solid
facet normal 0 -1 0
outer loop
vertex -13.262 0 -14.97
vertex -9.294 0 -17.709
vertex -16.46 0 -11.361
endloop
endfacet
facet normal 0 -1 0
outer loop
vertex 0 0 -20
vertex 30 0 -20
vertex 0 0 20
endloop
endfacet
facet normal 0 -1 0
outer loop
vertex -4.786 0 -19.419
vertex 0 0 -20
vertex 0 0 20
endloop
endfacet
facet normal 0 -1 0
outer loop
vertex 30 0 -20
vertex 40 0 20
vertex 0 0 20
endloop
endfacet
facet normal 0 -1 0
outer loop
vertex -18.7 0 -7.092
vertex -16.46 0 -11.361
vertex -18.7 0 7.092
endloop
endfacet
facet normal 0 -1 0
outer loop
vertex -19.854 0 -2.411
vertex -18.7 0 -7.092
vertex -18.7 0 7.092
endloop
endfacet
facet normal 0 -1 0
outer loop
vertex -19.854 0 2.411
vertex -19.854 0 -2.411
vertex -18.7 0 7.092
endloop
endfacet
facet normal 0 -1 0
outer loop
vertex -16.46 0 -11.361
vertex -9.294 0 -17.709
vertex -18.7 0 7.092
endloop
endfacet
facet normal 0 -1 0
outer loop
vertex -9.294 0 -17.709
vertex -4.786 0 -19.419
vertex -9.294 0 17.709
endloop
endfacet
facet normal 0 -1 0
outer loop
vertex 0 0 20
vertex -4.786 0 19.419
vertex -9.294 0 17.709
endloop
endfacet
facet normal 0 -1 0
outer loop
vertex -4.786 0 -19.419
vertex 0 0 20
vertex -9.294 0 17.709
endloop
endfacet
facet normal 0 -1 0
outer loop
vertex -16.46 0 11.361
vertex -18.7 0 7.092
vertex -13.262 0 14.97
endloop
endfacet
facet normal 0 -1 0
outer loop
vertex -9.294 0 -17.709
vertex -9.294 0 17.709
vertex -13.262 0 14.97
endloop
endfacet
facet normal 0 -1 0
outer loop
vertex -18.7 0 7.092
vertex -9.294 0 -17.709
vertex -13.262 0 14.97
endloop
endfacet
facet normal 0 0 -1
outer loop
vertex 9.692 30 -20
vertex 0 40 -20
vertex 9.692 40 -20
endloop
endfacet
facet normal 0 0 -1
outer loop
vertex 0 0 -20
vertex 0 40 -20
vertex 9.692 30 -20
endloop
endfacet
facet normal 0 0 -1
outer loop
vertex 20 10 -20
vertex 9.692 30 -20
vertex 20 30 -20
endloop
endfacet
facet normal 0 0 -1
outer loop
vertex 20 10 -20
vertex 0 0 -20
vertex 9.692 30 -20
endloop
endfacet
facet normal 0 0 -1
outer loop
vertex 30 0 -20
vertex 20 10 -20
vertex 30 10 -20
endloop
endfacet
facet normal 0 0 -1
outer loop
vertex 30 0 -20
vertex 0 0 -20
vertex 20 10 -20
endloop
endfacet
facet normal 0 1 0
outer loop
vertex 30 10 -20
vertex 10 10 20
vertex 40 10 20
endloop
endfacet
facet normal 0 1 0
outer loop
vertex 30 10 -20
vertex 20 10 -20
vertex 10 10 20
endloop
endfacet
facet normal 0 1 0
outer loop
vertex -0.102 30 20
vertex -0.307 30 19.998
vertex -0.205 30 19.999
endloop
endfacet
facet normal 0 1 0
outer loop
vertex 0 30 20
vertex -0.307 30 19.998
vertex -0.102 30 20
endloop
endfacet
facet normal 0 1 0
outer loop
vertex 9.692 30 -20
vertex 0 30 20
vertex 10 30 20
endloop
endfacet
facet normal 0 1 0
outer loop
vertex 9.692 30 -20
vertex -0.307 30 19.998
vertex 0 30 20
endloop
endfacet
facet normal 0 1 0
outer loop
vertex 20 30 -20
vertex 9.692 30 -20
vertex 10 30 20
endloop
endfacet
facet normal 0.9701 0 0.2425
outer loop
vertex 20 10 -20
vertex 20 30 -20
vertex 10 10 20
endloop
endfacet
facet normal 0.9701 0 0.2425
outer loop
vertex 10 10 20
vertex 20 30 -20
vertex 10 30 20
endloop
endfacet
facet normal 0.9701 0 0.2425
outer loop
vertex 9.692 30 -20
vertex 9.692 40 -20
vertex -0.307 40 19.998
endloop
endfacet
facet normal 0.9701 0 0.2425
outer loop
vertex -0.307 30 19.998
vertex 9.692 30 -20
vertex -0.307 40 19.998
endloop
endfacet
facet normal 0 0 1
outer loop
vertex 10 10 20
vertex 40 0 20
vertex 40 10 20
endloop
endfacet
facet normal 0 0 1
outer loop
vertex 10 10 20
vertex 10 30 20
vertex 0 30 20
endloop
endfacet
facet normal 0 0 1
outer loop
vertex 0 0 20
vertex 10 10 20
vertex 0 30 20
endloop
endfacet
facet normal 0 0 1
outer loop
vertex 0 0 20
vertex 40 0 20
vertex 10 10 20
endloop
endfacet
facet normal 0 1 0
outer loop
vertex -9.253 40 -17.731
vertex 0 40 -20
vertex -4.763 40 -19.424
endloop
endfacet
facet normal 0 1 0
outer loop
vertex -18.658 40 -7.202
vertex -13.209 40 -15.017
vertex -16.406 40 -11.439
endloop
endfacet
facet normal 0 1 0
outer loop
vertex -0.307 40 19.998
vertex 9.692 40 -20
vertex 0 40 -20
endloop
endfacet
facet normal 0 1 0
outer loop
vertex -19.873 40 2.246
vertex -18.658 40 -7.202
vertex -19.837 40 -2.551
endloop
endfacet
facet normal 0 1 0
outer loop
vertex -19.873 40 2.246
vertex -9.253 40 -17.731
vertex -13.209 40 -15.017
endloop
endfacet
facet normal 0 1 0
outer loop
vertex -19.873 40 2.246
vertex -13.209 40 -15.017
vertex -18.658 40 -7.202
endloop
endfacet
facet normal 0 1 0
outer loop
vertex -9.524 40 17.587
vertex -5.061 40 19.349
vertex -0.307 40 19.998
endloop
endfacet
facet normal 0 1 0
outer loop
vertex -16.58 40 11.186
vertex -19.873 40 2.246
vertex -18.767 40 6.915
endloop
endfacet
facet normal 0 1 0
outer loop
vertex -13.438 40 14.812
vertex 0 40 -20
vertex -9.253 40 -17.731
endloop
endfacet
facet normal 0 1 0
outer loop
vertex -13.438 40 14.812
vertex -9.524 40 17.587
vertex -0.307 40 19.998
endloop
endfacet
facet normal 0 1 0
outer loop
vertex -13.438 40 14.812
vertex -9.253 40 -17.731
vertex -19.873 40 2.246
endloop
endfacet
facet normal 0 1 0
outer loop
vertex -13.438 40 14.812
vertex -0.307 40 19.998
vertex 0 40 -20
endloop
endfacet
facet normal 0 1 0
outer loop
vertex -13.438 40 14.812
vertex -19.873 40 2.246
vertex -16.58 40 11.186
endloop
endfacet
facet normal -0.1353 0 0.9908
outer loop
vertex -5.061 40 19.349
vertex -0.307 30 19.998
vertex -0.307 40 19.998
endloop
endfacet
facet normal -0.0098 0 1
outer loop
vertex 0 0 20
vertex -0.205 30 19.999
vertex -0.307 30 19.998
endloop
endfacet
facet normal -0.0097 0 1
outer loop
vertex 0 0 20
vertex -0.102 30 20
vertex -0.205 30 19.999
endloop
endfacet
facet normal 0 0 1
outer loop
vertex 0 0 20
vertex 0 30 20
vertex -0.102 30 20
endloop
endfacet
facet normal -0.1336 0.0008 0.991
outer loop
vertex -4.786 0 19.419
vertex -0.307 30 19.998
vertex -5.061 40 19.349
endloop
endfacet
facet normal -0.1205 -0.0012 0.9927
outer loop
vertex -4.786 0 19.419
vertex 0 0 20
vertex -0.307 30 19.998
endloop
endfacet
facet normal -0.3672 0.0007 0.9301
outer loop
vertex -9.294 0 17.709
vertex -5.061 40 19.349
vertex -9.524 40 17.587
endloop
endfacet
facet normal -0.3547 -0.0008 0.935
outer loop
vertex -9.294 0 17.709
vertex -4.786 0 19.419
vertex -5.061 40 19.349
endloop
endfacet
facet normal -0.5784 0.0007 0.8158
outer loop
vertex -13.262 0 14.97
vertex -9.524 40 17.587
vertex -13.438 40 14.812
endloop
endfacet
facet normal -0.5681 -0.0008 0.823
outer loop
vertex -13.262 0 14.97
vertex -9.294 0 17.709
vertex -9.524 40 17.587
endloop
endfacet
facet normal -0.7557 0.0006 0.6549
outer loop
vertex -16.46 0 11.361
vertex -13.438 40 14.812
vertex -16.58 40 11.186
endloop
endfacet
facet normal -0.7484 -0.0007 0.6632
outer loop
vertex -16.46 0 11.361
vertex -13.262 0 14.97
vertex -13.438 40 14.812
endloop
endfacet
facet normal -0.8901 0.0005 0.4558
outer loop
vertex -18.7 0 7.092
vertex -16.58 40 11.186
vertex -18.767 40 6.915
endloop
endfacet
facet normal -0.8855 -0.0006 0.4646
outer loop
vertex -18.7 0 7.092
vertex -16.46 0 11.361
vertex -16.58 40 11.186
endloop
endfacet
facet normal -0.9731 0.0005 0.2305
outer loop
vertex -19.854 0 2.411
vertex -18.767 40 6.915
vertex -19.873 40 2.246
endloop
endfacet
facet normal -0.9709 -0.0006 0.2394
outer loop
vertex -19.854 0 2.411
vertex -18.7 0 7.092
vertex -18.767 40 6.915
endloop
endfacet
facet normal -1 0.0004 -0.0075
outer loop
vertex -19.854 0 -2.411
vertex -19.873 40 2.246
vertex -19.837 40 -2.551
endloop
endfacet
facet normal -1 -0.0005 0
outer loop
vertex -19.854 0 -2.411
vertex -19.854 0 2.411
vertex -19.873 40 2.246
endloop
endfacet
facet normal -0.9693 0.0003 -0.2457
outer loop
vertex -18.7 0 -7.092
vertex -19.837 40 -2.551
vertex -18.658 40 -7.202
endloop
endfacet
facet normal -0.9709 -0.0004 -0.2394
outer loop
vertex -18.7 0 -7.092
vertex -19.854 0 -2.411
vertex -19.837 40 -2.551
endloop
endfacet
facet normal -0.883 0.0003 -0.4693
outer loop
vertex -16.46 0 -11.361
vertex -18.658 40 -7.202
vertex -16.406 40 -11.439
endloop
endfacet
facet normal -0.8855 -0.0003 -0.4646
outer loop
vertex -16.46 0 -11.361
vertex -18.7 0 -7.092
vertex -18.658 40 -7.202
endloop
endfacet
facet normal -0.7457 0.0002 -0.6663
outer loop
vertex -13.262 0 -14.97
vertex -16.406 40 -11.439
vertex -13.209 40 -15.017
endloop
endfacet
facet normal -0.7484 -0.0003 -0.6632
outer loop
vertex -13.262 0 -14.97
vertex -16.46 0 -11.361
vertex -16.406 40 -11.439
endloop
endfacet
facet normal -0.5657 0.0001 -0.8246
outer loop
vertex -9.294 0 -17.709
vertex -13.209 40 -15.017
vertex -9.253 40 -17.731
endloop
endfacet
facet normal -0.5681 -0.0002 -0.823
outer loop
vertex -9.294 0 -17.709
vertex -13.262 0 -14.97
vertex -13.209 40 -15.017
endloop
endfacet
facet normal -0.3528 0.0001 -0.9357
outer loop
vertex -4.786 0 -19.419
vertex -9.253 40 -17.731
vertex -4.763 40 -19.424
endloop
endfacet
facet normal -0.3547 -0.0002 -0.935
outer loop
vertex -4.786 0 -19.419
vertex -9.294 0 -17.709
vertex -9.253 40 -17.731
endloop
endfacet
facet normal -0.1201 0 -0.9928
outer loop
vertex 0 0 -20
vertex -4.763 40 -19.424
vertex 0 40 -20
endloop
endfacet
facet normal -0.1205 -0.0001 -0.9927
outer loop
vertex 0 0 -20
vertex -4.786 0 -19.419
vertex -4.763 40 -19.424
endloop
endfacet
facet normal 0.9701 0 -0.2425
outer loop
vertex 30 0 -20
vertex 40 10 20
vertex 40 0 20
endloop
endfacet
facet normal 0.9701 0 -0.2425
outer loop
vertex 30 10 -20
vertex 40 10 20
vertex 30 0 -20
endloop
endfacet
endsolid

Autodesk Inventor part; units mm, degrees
ref_plane "YZ Plane" through (0, 0, 0) normal (1, 0, 0) x (0, 1, 0)
ref_plane "XZ Plane" through (0, 0, 0) normal (0, 1, 0) x (-1, 0, 0)
ref_plane "XY Plane" through (0, 0, 0) normal (0, 0, 1) x (1, 0, 0)
sketch "草圖1" plane through (0, 0, 0) normal (0, 1, 0) x (-1, 0, 0)
  circle A0 centre (0, 0) radius 20
  line L0 (0, -20) -> (-40, -20)
  line L1 (-40, -20) -> (-40, 20)
  line L2 (-40, 20) -> (0, 20)
  line L3 (0, 20) -> (0, -20)
  point P0 (0, 20)
  dimension "d0" = 40
  dimension "d1" = 40
extrude "擠出1" add sketch "草圖1" along normal blind 40
sketch "草圖2" plane through (0, 40, 0) normal (0, 1, 0) x (1, 0, 0)
  line L0 (0, 20) -> (40, 20) projected
  line L1 (40, 20) -> (40, -20) projected
  line L2 (40, -20) -> (0, -20) projected
  arc A0 (0, 20) -> (0, -20) centre (0, 0) ccw projected
  line L3 (0, -20) -> (40, -20) projected
  line L4 (40, -20) -> (30, 20)
  dimension "d4" = 10
extrude "擠出2" cut sketch "草圖2" against normal through all contours L0 L1 L4
sketch "草圖3" plane through (0, 40, 0) normal (0, 1, 0) x (1, 0, 0)
  line L0 (30, 20) -> (0, 20) projected
  line L1 (20, 20) -> (10, -20)
  line L2 (0, -20) -> (40, -20) projected
  line L3 (30, 20) -> (40, -20) projected
  line L4 (40, -20) -> (0, -20) projected
  arc A0 (0, 20) -> (0, -20) centre (0, 0) ccw projected
  line L5 (0, 20) -> (30, 20) projected
  dimension "d7" = 10
  dimension "d8" = 30
extrude "擠出3" cut sketch "草圖3" against normal blind 30 contours L3 L2 L1 L0
sketch "草圖4" plane through (0, 40, 0) normal (0, 1, 0) x (1, 0, 0)
  line L0 (20, 20) -> (10, -20) projected
  line L1 (10, -20) -> (0, -20) projected
  arc A0 (0, 20) -> (0, -20) centre (0, 0) ccw projected
  line L2 (0, 20) -> (20, 20) projected
  line L3 (20, 20) -> (0, 20) projected
  line L4 (9.6922, 20) -> (-0.3072, -19.9976)
  line L5 (0, -20) -> (40, -20) projected
  line L6 (10, -20) -> (20, 20) projected
  dimension "d11" = 10
extrude "擠出4" cut sketch "草圖4" against normal blind 10 contours L0 L1 A0 L4 L2
properties part number "6" material "鋼、碳鋼"
